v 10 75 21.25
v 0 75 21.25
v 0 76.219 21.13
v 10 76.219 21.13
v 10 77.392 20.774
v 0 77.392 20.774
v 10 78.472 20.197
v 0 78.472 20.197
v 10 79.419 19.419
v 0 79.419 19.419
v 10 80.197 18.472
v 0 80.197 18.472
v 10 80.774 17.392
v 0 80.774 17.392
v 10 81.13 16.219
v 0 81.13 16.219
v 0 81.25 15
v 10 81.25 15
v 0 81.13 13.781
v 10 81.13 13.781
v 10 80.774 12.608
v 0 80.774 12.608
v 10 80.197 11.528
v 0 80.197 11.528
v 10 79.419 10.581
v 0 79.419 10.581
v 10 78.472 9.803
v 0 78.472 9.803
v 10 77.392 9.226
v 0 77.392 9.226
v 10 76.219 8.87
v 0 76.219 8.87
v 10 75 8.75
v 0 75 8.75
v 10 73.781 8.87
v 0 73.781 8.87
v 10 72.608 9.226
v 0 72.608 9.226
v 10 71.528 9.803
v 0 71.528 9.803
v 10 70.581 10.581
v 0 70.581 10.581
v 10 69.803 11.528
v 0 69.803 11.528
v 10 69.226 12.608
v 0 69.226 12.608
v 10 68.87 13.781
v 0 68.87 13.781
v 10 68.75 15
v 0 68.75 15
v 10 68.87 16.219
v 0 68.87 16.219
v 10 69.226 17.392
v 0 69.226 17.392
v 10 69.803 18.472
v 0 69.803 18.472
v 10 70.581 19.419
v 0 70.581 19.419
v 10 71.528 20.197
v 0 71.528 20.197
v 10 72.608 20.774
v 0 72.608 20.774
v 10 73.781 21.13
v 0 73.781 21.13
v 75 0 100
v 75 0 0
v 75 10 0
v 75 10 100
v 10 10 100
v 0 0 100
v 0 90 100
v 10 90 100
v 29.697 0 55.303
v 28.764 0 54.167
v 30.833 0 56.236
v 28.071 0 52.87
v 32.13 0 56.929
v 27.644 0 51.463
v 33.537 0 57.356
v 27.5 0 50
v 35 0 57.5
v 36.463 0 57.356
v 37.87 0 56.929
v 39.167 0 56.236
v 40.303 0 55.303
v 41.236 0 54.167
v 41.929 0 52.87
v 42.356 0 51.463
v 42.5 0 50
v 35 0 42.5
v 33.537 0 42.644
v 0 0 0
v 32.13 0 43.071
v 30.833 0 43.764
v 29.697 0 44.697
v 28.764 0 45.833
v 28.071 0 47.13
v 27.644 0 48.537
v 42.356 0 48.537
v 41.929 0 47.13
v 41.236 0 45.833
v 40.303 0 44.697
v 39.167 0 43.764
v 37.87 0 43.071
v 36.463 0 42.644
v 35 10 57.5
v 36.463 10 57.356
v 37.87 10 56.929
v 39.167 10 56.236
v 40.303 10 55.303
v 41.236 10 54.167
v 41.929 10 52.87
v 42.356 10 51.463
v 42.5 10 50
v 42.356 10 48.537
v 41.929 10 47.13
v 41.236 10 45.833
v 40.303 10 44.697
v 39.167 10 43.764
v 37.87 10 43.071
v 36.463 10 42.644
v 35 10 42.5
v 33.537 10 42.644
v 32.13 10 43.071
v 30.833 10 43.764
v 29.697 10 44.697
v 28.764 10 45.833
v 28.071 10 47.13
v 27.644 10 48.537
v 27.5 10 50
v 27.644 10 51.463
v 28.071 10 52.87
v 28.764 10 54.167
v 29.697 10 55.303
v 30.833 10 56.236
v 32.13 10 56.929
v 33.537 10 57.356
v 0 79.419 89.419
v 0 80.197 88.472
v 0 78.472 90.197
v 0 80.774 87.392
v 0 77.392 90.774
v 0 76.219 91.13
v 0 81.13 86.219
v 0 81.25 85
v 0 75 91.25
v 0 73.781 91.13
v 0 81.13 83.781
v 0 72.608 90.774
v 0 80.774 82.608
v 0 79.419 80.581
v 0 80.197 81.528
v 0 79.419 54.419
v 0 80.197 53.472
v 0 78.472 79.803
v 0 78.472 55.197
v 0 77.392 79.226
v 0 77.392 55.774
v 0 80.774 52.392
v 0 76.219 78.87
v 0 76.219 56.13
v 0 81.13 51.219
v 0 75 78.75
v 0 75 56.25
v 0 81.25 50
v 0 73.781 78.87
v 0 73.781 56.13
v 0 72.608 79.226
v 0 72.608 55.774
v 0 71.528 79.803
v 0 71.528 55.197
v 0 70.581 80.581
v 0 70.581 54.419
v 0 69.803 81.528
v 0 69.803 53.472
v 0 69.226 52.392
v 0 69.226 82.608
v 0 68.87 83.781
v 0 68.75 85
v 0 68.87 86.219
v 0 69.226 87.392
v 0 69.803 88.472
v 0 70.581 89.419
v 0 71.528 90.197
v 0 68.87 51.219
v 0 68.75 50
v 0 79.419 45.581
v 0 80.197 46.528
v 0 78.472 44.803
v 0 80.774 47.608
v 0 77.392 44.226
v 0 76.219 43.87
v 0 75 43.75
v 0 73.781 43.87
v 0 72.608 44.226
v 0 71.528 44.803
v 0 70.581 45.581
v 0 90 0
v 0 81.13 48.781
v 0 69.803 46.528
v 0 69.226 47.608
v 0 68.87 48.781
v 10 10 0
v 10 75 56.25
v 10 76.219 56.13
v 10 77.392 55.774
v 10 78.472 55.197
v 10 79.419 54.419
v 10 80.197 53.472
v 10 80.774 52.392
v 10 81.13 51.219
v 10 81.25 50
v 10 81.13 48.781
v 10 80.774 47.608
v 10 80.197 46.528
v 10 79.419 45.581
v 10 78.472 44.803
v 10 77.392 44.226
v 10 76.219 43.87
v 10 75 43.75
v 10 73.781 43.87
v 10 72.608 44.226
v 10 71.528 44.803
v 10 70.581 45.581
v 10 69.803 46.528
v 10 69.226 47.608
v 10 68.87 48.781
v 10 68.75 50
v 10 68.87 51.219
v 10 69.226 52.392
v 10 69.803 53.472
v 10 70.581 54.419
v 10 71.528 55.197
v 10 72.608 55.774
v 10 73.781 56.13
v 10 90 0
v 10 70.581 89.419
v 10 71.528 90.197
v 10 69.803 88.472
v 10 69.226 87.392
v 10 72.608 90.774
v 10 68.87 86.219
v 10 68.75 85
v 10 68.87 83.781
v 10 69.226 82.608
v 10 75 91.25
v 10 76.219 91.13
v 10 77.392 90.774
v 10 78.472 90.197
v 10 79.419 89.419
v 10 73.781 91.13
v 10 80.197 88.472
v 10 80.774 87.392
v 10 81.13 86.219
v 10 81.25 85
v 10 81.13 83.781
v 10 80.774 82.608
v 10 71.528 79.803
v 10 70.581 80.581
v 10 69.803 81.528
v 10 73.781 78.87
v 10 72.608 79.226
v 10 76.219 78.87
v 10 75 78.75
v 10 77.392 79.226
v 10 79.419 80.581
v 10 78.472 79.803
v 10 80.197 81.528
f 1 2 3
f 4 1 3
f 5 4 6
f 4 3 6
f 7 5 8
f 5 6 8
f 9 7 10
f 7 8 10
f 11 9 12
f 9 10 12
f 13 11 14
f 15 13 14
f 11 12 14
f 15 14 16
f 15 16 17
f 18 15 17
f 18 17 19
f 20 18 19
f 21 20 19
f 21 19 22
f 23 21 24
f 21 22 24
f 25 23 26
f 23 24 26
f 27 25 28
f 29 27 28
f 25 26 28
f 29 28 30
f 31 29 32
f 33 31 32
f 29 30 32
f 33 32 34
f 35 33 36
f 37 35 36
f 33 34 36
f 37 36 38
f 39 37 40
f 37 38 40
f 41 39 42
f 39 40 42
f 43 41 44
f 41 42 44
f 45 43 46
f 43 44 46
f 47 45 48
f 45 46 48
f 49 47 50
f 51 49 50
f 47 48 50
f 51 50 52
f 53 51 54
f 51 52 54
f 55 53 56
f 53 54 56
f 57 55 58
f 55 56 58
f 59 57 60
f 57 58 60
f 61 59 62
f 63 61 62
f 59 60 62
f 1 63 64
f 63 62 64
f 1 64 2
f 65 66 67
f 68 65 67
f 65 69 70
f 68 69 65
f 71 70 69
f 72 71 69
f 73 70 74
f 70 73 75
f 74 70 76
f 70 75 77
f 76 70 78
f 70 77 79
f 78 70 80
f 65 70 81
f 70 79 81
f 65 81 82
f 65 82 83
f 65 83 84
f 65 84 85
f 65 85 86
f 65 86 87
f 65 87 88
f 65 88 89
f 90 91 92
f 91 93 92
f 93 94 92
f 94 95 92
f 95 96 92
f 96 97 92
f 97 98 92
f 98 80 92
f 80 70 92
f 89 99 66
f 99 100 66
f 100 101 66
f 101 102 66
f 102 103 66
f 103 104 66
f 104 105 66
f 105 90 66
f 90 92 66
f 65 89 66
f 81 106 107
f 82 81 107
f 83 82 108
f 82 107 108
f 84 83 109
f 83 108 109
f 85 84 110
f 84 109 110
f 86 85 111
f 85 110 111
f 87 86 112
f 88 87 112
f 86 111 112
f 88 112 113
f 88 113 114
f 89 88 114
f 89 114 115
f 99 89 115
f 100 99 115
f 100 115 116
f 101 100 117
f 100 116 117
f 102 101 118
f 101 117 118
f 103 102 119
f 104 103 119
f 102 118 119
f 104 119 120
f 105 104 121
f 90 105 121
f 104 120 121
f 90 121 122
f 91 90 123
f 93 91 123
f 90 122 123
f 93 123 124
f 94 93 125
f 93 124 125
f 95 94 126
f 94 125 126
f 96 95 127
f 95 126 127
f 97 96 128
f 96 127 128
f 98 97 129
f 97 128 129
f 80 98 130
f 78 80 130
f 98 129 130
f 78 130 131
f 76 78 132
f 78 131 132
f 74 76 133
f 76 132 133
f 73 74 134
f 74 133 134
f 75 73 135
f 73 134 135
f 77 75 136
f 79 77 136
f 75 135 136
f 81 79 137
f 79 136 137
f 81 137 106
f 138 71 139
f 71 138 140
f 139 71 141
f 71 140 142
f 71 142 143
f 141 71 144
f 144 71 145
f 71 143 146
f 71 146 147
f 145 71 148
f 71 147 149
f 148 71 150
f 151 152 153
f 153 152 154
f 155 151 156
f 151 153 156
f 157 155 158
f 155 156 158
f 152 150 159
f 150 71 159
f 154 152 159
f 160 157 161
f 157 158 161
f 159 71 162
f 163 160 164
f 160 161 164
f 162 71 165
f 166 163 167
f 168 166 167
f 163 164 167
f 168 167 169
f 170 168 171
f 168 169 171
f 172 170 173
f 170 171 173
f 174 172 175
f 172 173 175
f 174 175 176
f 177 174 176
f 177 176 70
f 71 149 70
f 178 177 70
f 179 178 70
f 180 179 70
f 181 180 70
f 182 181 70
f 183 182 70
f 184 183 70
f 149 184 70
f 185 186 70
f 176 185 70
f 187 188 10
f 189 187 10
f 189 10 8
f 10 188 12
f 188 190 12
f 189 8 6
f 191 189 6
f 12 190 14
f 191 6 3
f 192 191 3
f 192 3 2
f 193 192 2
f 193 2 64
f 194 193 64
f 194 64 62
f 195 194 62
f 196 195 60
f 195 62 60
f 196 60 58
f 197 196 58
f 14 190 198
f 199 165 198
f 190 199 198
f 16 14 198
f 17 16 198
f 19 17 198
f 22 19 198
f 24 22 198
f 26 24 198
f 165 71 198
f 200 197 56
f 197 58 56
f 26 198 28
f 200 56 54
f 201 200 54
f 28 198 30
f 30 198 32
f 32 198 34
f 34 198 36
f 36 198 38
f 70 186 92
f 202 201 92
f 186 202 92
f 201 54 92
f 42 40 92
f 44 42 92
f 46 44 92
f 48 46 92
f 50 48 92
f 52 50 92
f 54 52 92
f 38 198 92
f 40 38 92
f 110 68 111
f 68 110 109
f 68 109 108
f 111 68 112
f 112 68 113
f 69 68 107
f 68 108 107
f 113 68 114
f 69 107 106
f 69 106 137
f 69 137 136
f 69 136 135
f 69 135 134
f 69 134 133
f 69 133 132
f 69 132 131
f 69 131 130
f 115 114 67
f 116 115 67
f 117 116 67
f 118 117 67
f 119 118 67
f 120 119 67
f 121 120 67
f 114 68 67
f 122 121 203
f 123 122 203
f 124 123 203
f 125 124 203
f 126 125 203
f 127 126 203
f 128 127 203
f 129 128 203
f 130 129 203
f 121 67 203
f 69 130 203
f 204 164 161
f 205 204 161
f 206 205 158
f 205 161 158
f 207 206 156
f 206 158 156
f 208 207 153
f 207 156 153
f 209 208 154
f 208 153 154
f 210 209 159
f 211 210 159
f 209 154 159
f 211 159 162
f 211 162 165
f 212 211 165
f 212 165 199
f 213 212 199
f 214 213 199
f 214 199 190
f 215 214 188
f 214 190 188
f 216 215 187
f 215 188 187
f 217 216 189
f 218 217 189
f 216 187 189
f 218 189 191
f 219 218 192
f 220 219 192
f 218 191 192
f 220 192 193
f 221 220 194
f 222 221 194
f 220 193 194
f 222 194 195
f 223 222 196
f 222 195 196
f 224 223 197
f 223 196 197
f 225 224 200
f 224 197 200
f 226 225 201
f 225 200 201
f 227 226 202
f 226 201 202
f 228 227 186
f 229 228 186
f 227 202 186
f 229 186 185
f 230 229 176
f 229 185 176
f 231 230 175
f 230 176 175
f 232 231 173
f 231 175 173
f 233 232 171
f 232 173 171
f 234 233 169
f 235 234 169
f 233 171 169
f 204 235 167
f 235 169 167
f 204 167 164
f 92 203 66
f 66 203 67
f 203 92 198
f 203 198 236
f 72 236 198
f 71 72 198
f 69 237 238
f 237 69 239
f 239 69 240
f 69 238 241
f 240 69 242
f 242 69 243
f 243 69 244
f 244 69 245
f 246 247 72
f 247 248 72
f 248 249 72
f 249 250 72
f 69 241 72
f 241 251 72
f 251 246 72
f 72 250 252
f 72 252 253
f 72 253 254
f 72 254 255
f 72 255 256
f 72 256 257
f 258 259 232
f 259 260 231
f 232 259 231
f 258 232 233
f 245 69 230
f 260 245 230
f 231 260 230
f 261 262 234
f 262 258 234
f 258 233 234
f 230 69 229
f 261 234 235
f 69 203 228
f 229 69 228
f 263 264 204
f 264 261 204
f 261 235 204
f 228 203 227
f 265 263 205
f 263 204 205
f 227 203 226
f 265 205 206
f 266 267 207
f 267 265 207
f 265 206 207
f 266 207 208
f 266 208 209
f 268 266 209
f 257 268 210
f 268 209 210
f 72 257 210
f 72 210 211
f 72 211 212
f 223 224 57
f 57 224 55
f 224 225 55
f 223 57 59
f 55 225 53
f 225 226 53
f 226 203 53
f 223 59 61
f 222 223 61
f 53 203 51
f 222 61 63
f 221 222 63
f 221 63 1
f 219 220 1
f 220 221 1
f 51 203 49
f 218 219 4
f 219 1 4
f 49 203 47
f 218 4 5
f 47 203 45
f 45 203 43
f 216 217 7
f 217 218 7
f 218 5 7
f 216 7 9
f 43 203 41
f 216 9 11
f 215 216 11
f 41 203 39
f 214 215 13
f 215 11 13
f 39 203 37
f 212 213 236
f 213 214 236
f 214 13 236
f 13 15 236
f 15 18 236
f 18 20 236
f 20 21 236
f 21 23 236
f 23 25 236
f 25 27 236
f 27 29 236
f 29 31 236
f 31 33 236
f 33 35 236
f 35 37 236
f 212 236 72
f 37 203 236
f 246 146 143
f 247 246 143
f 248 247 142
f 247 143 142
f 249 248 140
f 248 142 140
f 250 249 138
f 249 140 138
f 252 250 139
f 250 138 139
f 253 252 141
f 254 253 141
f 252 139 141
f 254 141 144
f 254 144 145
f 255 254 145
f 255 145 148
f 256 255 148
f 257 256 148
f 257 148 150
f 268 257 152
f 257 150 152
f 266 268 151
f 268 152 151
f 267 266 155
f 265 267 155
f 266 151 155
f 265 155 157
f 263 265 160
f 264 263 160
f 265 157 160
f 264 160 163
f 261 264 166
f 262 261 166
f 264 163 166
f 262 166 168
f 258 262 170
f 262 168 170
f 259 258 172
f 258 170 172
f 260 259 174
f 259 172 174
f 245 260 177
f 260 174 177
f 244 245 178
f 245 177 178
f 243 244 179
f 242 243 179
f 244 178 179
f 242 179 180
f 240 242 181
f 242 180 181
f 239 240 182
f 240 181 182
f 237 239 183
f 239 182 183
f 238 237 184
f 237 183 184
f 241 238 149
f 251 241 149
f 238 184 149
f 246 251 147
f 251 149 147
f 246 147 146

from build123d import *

# Parameters (mm, degrees)
EXTRUIR_L_MINA1_DEPTH = 100
CROQUIS2_R            = 6.25
CORTAR_EXTRUIR1_DEPTH = 10
CROQUIS3_R            = 7.5
CORTAR_EXTRUIR2_DEPTH = 10


with BuildPart() as part:
    # Croquis1 → Extruir-Lámina1 (new body)
    with BuildSketch(Plane.XY):
        Polygon((0, 90), (0, 0), (75, 0), (75, 10), (10, 10), (10, 90), align=None)
    extrude(amount=EXTRUIR_L_MINA1_DEPTH)

    # Croquis2 → Cortar-Extruir1 (cut)
    with BuildSketch(Plane.ZY):
        with Locations((15, 75)):
            Circle(CROQUIS2_R)
        with Locations((50, 75)):
            Circle(CROQUIS2_R)
        with Locations((85, 75)):
            Circle(CROQUIS2_R)
    extrude(amount=-CORTAR_EXTRUIR1_DEPTH, mode=Mode.SUBTRACT)

    # Croquis3 → Cortar-Extruir2 (cut)
    with BuildSketch(Plane(origin=(0, 10, 0), x_dir=(1, 0, 0), z_dir=(0, 1, 0))):
        with Locations(Location((35, -50, 0), (0, 0, 270))):
            Circle(CROQUIS3_R)
    extrude(amount=-CORTAR_EXTRUIR2_DEPTH, mode=Mode.SUBTRACT)


solid = part.part
